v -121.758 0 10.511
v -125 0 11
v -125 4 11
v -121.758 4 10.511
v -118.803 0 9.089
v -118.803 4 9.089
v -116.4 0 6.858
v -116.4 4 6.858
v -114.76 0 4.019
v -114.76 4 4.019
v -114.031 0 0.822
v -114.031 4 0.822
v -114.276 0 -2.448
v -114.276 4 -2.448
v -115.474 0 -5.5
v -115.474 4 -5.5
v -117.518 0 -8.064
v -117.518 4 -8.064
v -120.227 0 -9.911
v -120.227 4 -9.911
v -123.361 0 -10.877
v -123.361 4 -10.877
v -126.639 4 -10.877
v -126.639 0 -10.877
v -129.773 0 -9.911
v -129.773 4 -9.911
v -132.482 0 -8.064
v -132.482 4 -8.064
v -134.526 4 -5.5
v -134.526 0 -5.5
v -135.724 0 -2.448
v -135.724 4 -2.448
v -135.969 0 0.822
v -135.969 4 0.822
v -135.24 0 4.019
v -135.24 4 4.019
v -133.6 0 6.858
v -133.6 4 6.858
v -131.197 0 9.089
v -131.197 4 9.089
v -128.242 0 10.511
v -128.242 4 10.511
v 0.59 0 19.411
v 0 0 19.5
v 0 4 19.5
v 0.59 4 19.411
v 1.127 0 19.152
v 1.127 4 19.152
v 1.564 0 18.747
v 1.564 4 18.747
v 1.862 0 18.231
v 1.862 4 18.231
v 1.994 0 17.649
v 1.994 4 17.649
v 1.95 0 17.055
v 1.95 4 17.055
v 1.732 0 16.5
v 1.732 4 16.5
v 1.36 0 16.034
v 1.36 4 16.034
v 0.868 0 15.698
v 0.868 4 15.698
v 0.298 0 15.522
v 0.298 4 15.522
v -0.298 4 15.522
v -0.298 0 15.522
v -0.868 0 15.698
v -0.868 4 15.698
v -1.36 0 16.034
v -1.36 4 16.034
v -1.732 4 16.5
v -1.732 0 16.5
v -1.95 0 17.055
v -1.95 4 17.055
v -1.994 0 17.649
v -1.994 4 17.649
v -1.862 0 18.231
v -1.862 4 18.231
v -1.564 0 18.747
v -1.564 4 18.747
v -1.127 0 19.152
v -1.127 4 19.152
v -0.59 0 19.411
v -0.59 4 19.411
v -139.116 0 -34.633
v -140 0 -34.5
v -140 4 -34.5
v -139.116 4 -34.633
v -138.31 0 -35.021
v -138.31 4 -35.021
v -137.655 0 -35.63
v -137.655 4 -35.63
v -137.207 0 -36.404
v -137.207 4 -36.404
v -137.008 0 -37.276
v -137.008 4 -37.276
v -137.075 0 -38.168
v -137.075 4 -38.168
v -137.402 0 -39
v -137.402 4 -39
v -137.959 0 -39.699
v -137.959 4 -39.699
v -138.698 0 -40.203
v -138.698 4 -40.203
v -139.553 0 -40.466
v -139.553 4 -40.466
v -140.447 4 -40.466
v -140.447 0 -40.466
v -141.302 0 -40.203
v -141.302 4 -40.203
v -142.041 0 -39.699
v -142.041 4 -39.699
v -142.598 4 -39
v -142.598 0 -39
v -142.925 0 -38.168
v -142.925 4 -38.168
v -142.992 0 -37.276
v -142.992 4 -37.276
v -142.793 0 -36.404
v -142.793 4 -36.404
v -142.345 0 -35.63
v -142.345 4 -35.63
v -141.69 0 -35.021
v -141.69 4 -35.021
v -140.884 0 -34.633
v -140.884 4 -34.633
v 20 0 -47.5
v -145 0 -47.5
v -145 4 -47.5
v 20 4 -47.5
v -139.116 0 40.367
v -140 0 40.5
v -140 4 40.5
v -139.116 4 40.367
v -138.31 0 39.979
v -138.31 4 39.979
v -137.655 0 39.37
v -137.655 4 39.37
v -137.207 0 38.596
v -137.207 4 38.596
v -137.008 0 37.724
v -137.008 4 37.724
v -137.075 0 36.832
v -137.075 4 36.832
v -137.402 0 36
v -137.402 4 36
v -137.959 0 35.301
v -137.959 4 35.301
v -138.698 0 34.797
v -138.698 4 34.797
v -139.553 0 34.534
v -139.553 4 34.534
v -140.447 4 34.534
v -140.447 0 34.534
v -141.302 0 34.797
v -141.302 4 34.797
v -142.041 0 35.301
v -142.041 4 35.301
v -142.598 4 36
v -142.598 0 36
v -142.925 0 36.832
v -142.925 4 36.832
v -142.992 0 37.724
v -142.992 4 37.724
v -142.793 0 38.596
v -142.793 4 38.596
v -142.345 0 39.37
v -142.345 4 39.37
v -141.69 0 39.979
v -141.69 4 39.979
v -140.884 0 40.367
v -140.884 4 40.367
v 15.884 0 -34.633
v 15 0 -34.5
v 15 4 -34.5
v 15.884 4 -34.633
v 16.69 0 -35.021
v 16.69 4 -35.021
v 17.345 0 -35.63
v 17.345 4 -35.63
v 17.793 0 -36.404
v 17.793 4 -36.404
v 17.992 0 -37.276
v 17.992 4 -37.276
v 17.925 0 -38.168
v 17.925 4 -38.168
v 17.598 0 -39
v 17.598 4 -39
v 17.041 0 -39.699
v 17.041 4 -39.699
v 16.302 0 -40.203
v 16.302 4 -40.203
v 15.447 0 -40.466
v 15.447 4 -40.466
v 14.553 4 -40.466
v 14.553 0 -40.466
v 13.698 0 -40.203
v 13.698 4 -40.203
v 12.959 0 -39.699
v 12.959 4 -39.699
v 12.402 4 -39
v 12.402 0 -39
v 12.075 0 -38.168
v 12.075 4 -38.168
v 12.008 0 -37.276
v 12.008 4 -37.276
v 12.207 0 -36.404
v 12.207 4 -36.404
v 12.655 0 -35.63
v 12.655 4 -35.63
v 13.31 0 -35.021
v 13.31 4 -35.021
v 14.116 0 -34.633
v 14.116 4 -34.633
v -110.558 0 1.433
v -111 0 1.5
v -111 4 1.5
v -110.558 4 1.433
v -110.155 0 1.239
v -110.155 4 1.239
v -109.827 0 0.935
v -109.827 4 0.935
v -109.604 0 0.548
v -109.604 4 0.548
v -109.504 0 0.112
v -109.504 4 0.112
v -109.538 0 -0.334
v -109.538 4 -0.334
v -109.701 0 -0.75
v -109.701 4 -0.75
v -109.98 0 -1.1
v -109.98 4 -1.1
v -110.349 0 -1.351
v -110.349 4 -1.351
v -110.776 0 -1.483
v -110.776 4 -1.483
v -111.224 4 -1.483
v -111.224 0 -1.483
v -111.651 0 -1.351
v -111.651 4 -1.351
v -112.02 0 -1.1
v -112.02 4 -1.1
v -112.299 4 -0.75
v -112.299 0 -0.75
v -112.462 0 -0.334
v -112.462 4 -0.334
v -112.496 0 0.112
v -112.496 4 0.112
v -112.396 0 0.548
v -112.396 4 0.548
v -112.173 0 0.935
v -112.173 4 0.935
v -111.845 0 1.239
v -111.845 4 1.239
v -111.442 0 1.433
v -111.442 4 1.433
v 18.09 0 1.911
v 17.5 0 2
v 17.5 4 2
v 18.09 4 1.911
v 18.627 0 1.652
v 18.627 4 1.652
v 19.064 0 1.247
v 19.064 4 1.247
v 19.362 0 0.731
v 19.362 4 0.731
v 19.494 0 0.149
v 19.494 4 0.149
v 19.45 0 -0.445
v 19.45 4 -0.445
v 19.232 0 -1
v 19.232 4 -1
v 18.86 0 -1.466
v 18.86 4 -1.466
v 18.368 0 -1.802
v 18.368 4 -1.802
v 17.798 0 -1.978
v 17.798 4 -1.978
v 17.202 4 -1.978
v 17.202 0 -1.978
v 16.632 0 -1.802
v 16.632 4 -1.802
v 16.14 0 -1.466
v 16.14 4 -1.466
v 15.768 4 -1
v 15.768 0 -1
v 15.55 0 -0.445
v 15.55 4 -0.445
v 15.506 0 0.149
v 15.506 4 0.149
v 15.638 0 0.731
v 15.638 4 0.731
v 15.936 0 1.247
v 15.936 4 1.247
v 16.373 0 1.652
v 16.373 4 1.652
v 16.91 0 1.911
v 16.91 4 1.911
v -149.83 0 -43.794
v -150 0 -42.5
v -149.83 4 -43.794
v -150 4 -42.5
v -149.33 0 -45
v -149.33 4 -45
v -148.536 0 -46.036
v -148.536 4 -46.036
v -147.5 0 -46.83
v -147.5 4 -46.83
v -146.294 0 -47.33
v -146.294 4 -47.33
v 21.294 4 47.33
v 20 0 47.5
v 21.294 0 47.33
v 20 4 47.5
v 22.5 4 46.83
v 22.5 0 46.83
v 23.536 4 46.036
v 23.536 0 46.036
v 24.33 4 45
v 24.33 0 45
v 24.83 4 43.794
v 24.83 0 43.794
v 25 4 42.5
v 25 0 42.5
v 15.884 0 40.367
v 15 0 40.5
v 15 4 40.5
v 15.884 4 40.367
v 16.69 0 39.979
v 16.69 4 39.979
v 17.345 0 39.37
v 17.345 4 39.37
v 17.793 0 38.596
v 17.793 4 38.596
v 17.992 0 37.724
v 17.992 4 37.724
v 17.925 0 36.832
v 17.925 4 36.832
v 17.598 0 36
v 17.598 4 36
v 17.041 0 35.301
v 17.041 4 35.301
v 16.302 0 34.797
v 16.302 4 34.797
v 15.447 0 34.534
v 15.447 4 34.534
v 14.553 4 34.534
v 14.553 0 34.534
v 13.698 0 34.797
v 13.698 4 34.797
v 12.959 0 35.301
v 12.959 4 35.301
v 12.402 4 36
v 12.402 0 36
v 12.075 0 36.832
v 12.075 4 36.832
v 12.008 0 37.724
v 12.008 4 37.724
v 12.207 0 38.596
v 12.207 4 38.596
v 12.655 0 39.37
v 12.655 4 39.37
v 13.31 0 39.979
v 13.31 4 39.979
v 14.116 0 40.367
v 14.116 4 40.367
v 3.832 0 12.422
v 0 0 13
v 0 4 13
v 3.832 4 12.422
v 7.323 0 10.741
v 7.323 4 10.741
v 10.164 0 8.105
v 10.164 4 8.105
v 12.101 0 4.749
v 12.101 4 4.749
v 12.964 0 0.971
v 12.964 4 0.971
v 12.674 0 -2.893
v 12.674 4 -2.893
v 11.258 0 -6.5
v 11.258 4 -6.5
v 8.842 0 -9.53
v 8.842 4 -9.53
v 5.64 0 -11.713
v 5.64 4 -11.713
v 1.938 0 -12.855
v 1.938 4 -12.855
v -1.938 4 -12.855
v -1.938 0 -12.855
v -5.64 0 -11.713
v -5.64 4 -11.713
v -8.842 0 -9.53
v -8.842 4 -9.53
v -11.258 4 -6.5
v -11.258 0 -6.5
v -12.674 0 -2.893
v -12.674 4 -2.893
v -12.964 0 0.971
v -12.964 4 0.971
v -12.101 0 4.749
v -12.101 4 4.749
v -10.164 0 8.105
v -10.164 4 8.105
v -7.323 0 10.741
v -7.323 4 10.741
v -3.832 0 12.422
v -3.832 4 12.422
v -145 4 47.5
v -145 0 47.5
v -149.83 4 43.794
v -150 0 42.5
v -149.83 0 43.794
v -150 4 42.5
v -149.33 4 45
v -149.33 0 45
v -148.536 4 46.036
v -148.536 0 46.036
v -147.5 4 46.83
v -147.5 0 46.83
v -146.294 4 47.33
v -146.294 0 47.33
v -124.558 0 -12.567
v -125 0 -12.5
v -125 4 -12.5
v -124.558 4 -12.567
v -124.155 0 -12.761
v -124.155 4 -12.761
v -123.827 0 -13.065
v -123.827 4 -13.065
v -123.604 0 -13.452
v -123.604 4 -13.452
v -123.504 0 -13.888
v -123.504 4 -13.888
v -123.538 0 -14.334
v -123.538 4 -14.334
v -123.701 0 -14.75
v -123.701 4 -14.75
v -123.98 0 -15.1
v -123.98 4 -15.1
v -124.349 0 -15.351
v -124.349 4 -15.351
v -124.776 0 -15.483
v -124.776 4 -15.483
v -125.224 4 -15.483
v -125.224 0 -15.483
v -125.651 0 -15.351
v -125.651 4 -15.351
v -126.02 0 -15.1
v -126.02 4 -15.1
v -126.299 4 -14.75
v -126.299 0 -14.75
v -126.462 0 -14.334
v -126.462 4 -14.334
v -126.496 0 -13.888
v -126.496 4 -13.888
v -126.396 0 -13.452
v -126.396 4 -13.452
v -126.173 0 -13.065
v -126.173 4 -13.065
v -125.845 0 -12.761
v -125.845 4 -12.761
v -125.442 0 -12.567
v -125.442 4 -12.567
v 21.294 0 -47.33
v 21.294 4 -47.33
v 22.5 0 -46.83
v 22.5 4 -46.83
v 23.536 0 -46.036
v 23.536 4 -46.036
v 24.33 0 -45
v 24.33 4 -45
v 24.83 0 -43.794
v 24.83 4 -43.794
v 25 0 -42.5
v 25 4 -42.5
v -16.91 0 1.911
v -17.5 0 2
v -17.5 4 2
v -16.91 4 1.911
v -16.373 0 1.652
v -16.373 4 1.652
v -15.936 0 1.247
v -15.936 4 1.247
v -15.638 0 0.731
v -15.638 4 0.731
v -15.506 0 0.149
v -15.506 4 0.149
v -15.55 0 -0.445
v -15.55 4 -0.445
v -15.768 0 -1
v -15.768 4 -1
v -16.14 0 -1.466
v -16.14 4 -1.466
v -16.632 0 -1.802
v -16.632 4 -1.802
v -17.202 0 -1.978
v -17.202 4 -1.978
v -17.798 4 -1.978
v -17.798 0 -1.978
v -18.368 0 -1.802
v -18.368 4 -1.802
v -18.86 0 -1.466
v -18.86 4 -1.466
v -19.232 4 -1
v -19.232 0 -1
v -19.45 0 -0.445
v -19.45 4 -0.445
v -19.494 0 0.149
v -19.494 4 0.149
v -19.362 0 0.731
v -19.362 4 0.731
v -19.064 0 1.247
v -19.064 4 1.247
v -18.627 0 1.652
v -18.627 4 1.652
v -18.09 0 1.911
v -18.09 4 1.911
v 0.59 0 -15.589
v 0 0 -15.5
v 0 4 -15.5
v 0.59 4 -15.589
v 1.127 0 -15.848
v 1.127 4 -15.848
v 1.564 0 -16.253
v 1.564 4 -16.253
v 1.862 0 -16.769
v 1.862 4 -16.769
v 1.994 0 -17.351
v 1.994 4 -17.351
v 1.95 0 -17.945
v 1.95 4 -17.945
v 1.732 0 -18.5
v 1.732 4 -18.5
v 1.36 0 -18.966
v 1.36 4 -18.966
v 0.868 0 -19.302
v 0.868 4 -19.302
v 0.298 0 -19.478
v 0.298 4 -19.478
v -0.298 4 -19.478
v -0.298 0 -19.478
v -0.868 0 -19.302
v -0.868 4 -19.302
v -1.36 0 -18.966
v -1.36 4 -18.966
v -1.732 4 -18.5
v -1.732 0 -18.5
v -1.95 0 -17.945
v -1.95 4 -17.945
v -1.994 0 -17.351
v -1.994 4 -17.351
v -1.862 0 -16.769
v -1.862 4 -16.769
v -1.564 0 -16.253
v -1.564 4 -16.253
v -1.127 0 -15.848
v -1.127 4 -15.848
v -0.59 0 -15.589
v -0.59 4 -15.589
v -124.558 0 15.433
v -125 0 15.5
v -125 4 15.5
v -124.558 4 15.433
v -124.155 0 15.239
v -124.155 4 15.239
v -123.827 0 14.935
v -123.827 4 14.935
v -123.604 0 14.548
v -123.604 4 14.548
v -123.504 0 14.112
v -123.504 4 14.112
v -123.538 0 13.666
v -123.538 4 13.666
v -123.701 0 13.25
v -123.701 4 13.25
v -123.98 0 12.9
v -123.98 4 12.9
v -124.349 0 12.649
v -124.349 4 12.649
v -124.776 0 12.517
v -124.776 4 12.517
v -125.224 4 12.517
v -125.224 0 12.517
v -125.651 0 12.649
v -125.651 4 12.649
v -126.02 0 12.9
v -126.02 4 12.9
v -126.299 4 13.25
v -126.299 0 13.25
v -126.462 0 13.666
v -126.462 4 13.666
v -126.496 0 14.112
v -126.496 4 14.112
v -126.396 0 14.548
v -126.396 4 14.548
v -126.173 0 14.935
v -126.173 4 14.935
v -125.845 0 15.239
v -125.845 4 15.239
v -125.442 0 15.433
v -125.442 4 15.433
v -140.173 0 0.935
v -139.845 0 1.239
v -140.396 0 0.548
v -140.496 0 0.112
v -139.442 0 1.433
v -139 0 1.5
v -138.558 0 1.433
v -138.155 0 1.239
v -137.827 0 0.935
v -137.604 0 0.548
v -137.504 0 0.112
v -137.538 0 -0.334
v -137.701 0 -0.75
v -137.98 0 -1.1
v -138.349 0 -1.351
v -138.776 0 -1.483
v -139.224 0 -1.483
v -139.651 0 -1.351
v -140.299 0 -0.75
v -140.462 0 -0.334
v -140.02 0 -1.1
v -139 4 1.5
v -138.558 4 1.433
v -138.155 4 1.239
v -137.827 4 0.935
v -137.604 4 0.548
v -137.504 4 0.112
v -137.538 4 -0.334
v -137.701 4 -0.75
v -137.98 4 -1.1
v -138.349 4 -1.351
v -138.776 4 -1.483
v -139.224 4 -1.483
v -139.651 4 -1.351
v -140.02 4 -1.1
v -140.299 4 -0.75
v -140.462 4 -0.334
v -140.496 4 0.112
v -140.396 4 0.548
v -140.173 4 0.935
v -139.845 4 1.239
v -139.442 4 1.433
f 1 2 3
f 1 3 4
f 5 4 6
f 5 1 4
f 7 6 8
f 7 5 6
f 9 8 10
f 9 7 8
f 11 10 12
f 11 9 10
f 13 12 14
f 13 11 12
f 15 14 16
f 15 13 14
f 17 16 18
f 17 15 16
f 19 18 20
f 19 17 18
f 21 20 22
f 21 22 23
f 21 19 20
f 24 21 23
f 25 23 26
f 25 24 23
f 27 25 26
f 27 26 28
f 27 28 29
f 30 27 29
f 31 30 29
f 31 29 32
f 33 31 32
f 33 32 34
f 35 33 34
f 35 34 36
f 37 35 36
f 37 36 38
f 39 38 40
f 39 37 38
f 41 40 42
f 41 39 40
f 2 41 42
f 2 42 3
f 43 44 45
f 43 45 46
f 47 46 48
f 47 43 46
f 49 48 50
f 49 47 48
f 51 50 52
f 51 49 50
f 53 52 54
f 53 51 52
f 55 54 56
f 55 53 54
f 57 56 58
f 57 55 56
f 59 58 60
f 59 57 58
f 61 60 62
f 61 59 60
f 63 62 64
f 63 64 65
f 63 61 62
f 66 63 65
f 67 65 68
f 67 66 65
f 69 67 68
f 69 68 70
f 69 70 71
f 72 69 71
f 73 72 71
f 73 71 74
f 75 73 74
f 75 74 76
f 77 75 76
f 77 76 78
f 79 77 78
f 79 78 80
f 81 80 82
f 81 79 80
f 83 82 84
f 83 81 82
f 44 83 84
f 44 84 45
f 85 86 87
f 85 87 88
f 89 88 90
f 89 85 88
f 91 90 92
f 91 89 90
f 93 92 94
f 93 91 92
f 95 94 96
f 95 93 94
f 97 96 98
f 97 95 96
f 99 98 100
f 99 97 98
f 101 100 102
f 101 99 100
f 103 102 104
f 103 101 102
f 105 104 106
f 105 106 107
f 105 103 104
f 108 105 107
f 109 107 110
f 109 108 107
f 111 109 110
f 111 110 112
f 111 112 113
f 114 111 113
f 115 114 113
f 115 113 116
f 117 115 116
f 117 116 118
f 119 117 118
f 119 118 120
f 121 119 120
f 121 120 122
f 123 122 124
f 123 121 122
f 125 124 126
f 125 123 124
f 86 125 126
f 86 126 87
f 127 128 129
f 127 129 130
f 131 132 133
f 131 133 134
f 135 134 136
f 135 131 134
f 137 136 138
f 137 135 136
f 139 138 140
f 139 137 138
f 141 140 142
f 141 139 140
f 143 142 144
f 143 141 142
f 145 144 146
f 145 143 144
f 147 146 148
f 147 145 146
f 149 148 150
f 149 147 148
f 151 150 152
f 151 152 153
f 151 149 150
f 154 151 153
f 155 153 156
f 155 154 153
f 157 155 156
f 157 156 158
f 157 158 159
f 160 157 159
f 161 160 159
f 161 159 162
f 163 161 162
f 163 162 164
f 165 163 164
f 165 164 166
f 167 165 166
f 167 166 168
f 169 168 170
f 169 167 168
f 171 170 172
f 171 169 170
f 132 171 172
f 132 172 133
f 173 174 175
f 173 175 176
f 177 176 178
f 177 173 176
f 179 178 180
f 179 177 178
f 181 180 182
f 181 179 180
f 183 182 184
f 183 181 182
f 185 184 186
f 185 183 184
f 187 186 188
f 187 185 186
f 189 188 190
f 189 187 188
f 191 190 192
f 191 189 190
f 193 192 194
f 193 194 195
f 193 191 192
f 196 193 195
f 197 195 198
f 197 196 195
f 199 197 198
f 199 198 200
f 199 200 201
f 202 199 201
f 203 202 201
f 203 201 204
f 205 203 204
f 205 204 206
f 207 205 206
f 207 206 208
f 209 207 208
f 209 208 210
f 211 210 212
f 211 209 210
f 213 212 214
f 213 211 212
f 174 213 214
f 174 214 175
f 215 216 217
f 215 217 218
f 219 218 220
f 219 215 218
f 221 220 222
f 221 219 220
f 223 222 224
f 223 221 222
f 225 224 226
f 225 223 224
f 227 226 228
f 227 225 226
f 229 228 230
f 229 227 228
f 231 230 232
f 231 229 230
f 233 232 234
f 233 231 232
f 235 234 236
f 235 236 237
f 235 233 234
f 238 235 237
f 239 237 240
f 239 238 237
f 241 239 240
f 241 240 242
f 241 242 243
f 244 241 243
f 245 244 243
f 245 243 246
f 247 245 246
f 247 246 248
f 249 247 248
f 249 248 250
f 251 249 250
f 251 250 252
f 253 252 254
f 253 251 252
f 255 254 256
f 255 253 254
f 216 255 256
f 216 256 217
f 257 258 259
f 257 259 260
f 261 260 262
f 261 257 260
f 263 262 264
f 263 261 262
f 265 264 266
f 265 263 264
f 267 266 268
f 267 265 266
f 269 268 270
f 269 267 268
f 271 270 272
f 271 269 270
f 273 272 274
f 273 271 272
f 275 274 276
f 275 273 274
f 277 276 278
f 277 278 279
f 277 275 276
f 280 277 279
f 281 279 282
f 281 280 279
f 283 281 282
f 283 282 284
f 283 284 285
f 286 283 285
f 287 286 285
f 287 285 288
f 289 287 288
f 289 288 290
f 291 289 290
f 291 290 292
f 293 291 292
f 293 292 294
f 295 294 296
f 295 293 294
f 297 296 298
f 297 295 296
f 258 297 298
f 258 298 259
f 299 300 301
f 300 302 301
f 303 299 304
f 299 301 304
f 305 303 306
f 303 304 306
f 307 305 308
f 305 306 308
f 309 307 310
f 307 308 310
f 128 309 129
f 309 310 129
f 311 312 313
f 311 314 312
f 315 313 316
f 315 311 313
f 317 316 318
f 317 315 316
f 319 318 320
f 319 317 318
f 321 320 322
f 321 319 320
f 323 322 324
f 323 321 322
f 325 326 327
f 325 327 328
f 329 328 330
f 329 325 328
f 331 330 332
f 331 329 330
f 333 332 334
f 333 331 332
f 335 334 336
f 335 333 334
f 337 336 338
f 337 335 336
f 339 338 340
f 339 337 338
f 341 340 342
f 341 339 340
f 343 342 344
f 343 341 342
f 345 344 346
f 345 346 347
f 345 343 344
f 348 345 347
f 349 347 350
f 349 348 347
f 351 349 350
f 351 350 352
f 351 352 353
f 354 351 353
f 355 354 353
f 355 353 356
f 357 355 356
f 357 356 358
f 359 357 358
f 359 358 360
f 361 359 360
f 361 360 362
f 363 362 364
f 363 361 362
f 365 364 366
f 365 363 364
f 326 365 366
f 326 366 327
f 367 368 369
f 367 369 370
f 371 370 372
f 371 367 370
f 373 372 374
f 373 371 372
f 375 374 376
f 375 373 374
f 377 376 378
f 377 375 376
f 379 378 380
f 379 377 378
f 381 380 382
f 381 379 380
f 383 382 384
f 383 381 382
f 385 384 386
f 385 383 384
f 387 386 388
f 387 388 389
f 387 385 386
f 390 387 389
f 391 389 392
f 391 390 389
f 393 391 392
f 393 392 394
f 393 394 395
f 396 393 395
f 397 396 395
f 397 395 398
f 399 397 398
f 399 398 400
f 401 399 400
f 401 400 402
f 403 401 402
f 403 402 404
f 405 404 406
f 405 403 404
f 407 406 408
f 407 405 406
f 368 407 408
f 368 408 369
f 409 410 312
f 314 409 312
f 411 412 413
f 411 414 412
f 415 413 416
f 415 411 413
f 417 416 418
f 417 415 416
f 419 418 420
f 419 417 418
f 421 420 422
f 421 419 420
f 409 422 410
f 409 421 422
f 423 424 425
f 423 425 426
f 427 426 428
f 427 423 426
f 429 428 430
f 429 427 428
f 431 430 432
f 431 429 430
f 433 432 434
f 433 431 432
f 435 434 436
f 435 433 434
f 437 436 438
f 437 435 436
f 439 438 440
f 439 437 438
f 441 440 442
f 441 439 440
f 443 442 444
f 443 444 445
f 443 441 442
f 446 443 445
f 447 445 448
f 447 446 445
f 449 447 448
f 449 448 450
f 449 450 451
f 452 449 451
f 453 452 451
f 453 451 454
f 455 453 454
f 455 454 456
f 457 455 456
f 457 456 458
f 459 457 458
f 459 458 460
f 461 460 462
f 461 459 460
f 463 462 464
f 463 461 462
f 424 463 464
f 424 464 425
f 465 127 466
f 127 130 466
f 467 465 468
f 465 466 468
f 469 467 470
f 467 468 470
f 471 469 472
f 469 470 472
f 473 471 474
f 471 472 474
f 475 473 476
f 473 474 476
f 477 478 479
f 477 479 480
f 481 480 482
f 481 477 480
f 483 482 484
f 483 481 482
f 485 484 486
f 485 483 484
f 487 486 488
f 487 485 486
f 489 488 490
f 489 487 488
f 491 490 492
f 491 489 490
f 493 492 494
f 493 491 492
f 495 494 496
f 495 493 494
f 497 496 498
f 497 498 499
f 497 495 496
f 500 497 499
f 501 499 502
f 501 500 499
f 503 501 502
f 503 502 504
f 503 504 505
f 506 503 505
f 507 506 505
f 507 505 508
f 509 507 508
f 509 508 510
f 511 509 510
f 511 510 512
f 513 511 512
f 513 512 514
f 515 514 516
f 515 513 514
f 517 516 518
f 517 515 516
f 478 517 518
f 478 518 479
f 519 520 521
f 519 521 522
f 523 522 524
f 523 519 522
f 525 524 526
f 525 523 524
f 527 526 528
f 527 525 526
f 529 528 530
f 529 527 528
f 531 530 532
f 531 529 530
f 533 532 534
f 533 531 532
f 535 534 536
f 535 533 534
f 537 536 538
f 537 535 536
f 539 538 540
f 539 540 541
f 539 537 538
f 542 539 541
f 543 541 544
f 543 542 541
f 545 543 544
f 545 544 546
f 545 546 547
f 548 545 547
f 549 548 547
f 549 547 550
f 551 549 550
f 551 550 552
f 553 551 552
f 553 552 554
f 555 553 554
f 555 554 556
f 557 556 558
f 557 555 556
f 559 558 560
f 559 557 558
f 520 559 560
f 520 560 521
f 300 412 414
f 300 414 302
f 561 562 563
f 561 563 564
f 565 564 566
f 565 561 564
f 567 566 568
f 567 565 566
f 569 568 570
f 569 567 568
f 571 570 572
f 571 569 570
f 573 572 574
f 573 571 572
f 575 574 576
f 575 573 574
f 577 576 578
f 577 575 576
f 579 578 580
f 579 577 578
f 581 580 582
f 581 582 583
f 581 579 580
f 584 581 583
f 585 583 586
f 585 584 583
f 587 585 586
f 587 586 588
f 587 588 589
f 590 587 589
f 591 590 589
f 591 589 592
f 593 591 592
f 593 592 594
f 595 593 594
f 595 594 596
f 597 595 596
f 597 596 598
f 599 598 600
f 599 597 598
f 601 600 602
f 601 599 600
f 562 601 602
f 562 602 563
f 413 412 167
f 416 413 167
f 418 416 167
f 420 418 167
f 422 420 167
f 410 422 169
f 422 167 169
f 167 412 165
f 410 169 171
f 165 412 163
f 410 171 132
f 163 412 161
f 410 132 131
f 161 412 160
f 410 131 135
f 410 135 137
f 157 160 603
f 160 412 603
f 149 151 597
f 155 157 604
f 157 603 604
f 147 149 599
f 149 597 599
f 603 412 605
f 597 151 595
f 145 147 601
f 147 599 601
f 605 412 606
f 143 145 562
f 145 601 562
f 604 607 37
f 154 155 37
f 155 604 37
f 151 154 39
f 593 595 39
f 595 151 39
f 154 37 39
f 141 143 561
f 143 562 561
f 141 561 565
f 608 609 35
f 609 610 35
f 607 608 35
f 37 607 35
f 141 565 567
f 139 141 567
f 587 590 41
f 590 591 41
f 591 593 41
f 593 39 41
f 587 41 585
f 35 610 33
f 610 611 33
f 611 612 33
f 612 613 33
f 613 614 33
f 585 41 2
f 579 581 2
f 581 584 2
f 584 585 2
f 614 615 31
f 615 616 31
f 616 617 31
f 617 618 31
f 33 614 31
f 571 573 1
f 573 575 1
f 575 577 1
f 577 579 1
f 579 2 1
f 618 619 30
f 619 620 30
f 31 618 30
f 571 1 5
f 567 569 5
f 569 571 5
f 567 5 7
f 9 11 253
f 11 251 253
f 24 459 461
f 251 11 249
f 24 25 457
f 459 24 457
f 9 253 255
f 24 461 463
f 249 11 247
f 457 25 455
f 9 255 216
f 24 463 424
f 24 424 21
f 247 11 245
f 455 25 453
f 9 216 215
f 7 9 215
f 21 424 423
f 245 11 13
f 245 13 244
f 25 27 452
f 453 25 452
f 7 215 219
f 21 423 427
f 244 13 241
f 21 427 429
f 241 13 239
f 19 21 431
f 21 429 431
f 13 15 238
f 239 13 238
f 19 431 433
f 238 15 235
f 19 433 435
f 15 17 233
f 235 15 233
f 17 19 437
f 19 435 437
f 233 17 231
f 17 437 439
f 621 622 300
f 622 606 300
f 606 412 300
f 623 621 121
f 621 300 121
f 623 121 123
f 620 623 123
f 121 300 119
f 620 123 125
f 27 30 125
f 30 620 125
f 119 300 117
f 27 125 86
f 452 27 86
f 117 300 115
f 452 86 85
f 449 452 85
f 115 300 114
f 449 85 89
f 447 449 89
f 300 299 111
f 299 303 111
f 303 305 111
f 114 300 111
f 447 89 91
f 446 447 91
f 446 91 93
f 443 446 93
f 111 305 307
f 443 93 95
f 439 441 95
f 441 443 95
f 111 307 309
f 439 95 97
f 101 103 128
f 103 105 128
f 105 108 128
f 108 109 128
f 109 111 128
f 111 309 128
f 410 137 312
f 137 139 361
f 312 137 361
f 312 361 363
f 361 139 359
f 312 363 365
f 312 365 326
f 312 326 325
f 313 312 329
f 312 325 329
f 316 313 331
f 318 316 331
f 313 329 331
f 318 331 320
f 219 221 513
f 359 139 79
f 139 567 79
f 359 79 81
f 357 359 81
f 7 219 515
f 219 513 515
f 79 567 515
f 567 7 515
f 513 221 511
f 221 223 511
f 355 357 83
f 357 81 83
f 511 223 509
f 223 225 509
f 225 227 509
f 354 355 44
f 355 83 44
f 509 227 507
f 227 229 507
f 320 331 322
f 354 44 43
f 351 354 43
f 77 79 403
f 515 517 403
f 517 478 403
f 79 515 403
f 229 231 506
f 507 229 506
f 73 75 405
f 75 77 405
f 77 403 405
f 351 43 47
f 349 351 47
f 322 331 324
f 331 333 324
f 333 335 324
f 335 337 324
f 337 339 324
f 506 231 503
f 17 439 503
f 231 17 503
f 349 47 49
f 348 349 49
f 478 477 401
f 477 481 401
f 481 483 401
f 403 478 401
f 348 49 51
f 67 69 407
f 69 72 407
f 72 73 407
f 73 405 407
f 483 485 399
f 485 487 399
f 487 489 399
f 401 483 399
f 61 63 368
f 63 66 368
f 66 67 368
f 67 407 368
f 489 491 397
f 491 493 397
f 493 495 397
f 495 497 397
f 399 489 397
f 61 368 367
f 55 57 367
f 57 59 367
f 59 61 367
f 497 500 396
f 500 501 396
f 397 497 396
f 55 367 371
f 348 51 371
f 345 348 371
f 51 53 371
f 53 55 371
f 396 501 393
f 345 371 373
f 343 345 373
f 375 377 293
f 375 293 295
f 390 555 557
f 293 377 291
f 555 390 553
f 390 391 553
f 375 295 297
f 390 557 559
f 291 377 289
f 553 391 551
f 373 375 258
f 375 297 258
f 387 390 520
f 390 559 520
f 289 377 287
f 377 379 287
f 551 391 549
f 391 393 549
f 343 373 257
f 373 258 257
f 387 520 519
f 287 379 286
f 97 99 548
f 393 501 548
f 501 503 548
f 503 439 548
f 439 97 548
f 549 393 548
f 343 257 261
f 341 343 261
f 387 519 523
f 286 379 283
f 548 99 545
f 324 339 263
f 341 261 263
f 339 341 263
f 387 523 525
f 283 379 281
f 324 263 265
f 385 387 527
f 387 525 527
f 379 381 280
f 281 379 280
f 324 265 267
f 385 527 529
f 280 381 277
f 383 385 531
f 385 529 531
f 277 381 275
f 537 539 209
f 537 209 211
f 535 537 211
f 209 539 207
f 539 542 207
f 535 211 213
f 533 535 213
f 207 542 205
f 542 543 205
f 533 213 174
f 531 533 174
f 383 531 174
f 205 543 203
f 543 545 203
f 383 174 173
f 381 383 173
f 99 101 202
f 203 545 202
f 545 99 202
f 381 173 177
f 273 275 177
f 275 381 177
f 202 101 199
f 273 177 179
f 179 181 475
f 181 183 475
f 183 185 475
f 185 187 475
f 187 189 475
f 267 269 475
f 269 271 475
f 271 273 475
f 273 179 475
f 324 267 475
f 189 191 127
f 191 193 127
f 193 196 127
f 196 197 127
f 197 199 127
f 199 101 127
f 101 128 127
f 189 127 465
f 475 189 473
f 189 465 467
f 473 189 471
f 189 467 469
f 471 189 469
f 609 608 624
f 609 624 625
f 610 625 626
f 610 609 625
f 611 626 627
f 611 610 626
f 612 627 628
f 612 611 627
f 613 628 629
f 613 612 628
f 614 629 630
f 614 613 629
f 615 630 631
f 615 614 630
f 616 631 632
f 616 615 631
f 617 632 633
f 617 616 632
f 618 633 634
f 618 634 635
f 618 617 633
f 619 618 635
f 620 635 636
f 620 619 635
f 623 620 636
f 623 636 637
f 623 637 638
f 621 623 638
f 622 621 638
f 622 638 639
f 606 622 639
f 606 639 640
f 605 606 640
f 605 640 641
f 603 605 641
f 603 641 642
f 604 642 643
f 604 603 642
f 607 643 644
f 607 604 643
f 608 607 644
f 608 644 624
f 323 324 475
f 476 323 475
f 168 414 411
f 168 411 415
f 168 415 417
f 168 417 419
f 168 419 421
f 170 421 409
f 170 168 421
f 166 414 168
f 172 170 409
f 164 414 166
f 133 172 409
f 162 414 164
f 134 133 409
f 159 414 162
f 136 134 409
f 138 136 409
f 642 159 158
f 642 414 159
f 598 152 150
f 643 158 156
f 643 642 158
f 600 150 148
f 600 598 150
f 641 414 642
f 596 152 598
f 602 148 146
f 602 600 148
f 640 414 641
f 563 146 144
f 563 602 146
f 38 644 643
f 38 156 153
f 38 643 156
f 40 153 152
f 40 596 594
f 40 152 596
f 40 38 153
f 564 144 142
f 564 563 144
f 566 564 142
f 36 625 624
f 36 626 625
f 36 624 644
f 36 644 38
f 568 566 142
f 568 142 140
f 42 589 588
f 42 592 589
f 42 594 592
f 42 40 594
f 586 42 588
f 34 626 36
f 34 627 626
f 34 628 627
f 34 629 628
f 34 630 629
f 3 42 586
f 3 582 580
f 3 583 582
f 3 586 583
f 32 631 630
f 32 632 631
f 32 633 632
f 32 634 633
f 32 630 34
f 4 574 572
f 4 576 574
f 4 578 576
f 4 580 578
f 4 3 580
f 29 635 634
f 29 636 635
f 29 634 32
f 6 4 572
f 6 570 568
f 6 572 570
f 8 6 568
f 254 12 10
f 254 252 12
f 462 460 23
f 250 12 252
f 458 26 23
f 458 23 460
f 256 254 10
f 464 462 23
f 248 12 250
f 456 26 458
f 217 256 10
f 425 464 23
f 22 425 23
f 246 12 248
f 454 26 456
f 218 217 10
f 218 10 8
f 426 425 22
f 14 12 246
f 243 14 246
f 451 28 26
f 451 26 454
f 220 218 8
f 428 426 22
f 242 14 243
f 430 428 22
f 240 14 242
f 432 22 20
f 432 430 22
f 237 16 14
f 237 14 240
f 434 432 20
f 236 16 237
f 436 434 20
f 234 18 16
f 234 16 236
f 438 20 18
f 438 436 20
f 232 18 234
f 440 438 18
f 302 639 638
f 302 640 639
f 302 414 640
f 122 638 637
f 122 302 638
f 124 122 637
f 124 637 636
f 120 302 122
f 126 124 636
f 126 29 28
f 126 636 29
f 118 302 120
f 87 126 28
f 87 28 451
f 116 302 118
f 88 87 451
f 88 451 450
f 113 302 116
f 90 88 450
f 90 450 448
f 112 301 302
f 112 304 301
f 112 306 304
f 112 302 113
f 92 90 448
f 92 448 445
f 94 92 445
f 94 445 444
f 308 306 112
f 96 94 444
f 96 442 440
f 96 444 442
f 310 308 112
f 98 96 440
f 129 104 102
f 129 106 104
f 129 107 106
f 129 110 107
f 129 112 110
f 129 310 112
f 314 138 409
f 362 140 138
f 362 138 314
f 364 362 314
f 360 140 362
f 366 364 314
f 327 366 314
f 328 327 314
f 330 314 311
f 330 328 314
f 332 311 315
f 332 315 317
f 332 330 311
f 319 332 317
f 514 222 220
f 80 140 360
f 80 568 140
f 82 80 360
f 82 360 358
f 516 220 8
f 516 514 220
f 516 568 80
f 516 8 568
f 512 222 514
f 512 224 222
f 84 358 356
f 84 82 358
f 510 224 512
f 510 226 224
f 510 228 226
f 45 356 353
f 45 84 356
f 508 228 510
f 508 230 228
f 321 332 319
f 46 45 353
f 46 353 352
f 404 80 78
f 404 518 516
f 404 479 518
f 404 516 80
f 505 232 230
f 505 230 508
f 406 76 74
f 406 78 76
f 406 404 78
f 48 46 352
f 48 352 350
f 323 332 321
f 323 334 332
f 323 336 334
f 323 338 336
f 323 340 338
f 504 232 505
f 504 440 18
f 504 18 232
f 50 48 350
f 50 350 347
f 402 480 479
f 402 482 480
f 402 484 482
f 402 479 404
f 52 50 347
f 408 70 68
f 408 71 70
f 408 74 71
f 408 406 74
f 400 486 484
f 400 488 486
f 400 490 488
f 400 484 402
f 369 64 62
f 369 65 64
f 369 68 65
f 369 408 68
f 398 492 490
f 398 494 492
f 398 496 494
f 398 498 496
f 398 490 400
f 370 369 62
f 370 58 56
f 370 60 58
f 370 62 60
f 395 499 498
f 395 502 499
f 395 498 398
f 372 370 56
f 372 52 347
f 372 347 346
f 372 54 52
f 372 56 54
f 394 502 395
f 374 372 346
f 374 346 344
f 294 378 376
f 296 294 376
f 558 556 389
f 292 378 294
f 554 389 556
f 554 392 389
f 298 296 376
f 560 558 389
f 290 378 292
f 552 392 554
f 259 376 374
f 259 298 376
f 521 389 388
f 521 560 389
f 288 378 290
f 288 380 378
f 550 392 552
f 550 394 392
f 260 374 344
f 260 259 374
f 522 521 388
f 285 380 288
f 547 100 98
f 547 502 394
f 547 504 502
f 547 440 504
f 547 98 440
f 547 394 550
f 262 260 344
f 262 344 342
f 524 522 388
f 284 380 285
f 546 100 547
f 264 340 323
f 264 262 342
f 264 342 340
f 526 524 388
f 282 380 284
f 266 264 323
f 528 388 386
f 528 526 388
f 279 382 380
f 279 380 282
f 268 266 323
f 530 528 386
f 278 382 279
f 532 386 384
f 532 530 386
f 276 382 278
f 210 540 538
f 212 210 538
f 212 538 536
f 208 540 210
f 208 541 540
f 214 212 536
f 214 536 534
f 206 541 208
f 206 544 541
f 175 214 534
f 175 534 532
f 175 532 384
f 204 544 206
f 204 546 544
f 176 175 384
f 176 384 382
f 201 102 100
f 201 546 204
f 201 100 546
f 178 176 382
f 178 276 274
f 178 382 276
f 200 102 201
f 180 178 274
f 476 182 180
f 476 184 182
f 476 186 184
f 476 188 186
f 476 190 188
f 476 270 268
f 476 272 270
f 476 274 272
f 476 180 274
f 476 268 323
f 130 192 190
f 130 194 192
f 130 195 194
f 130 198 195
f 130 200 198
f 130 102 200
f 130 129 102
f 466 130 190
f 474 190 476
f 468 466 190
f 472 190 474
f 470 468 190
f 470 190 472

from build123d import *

# Parameters (mm, degrees)
SKETCH_1_W      = 175
SKETCH_1_H      = 95
SKETCH_1_R      = 13
SKETCH_1_R_2    = 11
SKETCH_1_R_3    = 2
SKETCH_1_R_4    = 3
SKETCH_1_R_5    = 1.5
EXTRUDE_1_DEPTH = 4
FILLET_1_R      = 5


with BuildPart() as part:
    # 草图1 → 凸台-拉伸1 (new body)
    with BuildSketch(Plane(origin=(0, 0, 0), x_dir=(1, 0, 0), z_dir=(0, 1, 0))):
        with Locations((-62.5, 0)):
            Rectangle(SKETCH_1_W, SKETCH_1_H)
        with Locations(Location((0, 0, 0), (0, 0, 270))):
            Circle(SKETCH_1_R, mode=Mode.SUBTRACT)
        with Locations(Location((-125, 0, 0), (0, 0, 270))):
            Circle(SKETCH_1_R_2, mode=Mode.SUBTRACT)
        with Locations(Location((0, 17.5, 0), (0, 0, 270))):
            Circle(SKETCH_1_R_3, mode=Mode.SUBTRACT)
        with Locations(Location((17.5, 0, 0), (0, 0, 270))):
            Circle(SKETCH_1_R_3, mode=Mode.SUBTRACT)
        with Locations(Location((0, -17.5, 0), (0, 0, 270))):
            Circle(SKETCH_1_R_3, mode=Mode.SUBTRACT)
        with Locations(Location((-17.5, 0, 0), (0, 0, 270))):
            Circle(SKETCH_1_R_3, mode=Mode.SUBTRACT)
        with Locations(Location((-140, 37.5, 0), (0, 0, 270))):
            Circle(SKETCH_1_R_4, mode=Mode.SUBTRACT)
        with Locations(Location((-140, -37.5, 0), (0, 0, 270))):
            Circle(SKETCH_1_R_4, mode=Mode.SUBTRACT)
        with Locations(Location((15, 37.5, 0), (0, 0, 270))):
            Circle(SKETCH_1_R_4, mode=Mode.SUBTRACT)
        with Locations(Location((15, -37.5, 0), (0, 0, 270))):
            Circle(SKETCH_1_R_4, mode=Mode.SUBTRACT)
        with Locations(Location((-125, 14, 0), (0, 0, 270))):
            Circle(SKETCH_1_R_5, mode=Mode.SUBTRACT)
        with Locations(Location((-111, 0, 0), (0, 0, 270))):
            Circle(SKETCH_1_R_5, mode=Mode.SUBTRACT)
        with Locations(Location((-125, -14, 0), (0, 0, 270))):
            Circle(SKETCH_1_R_5, mode=Mode.SUBTRACT)
        with Locations(Location((-139, 0, 0), (0, 0, 270))):
            Circle(SKETCH_1_R_5, mode=Mode.SUBTRACT)
    extrude(amount=EXTRUDE_1_DEPTH)

    # 圆角1
    fillet_1_edges = [part.edges().sort_by_distance(p)[0] for p in [
        (-150, 2, -47.5),
        (25, 2, -47.5),
        (25, 2, 47.5),
        (-150, 2, 47.5),
    ]]
    fillet(fillet_1_edges, radius=FILLET_1_R)


solid = part.part
